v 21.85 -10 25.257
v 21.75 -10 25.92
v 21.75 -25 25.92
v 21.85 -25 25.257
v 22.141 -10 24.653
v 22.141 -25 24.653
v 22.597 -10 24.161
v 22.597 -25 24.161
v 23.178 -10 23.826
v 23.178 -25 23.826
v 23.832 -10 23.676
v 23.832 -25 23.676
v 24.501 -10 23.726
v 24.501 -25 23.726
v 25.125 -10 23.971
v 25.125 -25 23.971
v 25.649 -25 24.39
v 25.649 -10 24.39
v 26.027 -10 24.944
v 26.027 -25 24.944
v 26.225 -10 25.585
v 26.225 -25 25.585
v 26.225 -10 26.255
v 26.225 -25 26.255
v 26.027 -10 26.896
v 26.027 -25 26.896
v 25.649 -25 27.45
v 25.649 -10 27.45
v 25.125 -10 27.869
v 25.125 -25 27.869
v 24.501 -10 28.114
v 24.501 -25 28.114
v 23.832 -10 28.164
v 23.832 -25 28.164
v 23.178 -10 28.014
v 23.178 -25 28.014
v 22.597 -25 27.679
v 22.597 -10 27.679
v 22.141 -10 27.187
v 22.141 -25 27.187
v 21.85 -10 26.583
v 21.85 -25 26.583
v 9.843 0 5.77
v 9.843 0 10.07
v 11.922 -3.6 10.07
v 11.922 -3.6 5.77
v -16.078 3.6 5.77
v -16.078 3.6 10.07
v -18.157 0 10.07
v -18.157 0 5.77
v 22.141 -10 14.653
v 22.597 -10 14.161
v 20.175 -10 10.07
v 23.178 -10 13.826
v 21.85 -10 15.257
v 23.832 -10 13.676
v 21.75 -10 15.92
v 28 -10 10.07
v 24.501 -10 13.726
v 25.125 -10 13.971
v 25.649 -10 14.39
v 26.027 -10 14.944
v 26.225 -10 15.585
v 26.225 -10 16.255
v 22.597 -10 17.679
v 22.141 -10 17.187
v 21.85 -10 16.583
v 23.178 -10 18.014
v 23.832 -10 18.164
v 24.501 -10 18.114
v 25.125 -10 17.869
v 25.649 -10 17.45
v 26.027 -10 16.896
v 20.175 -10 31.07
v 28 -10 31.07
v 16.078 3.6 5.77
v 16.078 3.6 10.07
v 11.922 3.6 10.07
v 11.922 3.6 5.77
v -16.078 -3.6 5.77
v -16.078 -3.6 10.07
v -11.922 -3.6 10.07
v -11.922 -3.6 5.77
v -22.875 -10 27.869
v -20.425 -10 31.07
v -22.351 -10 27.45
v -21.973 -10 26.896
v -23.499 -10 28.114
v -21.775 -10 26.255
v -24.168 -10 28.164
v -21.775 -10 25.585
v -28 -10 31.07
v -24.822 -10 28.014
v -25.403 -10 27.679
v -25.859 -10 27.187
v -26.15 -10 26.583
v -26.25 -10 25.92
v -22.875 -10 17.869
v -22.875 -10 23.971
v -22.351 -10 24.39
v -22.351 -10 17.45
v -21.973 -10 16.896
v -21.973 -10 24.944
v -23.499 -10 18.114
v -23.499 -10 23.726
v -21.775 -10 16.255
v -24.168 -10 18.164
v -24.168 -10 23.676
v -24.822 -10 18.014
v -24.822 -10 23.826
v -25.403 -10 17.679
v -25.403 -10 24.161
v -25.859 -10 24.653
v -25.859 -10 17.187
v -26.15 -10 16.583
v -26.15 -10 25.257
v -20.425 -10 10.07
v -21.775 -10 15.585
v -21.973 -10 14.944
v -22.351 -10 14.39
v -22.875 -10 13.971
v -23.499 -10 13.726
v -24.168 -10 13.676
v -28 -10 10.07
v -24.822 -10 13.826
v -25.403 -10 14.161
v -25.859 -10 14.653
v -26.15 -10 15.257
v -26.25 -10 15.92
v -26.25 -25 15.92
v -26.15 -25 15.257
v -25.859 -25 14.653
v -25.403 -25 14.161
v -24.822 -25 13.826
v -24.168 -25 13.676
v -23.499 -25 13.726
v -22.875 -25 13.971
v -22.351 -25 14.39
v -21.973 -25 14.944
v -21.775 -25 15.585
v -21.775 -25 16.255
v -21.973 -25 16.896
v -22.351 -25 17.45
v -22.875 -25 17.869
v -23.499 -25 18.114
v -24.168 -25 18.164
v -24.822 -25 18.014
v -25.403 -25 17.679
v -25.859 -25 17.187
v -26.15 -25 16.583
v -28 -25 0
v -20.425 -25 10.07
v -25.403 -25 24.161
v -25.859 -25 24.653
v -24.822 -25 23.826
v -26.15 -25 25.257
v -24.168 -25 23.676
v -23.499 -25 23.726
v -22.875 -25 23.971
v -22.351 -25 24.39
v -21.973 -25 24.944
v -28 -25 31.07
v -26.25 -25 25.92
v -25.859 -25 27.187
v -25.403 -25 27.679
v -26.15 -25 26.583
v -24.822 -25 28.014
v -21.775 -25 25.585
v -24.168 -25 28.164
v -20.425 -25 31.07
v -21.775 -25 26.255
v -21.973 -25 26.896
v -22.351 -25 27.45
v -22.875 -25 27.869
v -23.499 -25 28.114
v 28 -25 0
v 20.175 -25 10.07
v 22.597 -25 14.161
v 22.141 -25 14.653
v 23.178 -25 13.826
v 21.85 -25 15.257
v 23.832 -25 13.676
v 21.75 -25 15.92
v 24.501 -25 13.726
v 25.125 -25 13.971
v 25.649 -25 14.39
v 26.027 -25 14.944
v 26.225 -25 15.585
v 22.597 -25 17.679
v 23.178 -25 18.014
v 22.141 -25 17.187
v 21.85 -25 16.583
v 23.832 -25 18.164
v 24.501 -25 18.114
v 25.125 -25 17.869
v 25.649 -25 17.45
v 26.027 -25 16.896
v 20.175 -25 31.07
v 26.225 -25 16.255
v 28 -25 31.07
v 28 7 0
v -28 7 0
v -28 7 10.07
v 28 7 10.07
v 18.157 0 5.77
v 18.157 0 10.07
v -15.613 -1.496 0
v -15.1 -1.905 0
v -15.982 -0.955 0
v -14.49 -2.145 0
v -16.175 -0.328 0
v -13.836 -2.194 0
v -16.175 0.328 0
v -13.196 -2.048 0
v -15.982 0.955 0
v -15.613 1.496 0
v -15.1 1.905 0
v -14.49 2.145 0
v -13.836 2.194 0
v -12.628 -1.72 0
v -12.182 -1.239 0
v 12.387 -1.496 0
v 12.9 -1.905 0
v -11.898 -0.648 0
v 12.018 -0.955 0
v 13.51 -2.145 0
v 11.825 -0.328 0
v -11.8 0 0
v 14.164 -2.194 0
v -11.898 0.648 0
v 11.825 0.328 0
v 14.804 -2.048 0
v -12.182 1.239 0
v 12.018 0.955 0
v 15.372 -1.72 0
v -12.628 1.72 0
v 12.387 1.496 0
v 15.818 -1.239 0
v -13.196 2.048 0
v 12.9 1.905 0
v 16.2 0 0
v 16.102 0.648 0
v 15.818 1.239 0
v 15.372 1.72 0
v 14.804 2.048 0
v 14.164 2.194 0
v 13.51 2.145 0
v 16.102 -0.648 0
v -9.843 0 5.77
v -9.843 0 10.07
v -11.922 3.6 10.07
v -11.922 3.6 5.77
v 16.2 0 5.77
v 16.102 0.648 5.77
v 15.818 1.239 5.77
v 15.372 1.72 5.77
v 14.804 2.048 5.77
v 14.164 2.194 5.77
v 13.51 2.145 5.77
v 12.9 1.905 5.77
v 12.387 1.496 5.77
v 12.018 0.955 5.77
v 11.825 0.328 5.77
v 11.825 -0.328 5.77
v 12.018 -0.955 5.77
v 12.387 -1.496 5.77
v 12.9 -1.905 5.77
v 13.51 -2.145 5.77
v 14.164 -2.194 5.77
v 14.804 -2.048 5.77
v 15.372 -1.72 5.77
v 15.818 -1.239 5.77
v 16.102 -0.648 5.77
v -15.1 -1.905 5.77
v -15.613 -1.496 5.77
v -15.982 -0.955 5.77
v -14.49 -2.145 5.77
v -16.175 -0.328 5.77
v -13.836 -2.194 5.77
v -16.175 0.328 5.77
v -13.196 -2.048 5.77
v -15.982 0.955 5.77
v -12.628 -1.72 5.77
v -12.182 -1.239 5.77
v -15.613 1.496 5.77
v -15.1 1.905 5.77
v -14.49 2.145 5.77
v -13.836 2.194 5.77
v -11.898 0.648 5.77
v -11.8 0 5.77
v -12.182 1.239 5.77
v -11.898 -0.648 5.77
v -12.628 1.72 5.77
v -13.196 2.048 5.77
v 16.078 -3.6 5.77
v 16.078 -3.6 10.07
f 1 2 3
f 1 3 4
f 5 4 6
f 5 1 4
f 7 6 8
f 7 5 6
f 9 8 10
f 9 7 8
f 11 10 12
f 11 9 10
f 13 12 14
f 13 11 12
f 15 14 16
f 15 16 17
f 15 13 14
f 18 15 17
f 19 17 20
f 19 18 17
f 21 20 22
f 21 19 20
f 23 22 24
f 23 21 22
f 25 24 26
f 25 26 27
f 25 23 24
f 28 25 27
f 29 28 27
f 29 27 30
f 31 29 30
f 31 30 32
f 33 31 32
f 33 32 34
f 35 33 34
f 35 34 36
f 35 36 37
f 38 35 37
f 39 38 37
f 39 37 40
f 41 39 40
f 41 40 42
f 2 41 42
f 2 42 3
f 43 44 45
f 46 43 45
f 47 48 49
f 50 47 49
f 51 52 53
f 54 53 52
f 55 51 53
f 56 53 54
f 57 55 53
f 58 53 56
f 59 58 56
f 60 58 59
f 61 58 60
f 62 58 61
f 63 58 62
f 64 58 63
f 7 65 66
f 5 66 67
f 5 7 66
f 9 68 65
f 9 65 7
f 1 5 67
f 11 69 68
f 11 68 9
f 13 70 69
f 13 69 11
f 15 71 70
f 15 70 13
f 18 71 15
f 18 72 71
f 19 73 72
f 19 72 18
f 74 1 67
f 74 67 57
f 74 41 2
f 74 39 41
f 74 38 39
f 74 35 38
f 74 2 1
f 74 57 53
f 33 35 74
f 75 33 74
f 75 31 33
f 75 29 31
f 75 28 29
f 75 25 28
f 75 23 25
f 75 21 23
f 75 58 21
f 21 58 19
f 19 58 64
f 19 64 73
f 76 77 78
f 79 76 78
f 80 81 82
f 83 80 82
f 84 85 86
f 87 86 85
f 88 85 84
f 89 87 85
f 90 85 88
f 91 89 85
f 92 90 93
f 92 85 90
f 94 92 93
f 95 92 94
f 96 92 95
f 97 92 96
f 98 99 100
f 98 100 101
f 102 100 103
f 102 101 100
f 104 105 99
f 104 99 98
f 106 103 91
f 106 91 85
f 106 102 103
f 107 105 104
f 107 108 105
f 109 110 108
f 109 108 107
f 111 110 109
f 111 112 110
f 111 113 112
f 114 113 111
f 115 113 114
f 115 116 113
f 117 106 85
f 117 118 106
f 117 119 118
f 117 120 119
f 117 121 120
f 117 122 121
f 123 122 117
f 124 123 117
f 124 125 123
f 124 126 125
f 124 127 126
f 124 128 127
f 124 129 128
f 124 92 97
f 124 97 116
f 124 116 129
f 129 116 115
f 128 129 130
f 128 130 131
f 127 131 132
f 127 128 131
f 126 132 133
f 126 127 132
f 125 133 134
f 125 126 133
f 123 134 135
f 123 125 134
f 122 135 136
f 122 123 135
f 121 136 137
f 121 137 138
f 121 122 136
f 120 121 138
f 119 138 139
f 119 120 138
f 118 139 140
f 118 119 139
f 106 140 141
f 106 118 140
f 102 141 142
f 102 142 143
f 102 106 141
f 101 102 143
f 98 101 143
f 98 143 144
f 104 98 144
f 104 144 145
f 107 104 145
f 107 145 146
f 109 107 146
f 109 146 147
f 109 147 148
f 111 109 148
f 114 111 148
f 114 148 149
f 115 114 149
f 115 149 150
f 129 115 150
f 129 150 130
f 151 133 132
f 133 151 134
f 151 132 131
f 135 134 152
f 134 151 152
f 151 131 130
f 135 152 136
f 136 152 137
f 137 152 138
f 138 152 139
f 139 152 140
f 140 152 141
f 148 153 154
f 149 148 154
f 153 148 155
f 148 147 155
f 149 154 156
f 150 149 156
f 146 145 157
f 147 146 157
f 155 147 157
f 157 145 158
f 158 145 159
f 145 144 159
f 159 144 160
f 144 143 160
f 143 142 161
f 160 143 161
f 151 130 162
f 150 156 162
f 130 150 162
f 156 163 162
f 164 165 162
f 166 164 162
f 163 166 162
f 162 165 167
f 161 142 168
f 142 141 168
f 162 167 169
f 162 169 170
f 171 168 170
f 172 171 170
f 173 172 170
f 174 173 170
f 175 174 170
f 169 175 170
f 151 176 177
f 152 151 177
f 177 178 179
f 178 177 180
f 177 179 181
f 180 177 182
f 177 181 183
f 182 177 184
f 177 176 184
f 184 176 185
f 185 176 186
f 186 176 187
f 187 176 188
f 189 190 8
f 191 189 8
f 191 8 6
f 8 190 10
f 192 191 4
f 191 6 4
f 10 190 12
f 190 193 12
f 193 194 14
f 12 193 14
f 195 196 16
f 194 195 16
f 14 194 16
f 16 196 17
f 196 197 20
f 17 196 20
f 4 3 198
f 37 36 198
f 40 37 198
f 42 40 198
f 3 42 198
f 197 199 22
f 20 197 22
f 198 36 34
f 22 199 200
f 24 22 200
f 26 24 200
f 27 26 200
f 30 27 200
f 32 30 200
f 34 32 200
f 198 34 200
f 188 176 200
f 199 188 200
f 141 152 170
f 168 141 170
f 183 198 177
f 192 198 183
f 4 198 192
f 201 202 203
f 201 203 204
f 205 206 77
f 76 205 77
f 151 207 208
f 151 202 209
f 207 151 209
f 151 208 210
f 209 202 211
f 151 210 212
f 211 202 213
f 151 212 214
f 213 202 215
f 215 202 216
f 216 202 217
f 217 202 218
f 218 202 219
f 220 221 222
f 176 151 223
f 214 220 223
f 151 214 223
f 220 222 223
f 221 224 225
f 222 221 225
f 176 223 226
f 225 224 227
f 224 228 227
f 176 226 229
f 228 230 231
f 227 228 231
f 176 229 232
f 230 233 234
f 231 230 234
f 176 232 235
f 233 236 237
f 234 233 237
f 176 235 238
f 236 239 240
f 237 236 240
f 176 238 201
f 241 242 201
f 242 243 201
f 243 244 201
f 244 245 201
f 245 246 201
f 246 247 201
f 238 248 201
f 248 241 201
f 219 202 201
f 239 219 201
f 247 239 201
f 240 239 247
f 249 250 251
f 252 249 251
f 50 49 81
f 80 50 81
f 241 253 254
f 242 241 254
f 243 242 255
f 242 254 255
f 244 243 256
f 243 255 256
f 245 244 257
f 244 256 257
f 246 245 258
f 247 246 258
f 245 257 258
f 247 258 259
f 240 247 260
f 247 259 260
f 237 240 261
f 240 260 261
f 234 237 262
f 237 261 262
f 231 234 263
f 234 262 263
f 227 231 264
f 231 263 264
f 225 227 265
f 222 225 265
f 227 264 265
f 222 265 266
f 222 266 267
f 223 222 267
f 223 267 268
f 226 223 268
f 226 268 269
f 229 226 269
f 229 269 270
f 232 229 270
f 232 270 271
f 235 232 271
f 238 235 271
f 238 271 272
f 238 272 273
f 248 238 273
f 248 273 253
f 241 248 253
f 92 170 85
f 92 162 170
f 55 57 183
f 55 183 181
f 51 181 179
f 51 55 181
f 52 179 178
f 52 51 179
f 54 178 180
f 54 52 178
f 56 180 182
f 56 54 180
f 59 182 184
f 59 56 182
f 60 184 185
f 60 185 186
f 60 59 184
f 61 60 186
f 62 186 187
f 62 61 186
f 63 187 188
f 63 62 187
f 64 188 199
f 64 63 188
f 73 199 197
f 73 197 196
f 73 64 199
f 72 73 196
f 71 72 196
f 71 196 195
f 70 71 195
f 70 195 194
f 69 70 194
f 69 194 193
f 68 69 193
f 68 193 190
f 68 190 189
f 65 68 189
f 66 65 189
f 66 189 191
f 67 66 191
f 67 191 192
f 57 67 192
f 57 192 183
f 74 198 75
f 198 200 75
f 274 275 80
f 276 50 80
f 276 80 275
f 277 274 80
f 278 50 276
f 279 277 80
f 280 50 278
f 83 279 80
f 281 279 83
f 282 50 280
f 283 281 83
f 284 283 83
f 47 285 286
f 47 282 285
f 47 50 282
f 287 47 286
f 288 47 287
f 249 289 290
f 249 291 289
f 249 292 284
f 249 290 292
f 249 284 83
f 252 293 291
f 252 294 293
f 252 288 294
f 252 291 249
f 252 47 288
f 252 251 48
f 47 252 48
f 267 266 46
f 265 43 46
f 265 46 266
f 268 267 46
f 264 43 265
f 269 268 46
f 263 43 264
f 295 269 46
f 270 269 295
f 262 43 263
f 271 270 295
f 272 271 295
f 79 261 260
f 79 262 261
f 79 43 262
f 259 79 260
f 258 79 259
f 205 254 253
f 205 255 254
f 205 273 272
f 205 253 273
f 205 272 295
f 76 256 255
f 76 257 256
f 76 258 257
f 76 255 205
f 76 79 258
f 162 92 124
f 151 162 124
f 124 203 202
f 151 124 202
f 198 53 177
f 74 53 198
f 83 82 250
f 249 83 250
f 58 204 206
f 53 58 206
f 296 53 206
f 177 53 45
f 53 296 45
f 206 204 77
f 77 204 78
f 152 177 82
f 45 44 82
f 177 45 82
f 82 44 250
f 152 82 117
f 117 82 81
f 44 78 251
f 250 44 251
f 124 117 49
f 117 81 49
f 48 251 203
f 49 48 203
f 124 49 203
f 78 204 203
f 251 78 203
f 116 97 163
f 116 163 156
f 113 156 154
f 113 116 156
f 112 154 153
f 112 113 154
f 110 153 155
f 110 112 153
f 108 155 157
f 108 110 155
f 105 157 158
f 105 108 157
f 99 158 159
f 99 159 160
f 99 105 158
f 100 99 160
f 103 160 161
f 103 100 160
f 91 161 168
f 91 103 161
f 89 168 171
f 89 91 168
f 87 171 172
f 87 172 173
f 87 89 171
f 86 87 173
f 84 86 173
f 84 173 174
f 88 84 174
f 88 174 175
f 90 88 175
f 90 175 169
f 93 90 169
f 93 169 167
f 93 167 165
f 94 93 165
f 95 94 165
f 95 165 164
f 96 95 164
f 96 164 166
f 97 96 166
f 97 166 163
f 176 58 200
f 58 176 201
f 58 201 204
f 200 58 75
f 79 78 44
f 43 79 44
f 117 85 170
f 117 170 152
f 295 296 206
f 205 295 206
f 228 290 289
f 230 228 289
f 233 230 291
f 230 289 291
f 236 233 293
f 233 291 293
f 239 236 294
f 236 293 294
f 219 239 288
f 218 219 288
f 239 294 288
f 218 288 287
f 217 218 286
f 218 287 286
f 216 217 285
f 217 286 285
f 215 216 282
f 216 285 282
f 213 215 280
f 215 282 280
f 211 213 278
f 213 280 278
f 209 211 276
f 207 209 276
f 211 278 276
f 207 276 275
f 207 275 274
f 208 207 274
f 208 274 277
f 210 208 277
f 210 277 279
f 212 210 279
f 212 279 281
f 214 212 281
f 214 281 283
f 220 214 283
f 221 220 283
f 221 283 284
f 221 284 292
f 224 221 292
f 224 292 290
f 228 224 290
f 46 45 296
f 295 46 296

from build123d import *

# Parameters (mm, degrees)
SZKIC1_W                       = 40
SZKIC1_H                       = 14
SZKIC1_R                       = 2
DODANIE_WYCI_GNI_CIE1_DEPTH    = 10.77
SZKIC2_W                       = 56
SZKIC2_H                       = 14
DODANIE_WYCI_GNI_CIE2_DEPTH    = 20.3
SZKIC5_R                       = 2.25
WYTNIJ_WYCI_GNI_CIE2_DEPTH     = 14
SZKIC8_W                       = 56
SZKIC8_H                       = 10.77
DODANIE_WYCI_GNI_CIE3_DEPTH    = 14
WYTNIJ_WYCI_GNI_CIE3_START     = -14
WYTNIJ_WYCI_GNI_CIE3_OUTLINE_W = 42
WYTNIJ_WYCI_GNI_CIE3_OUTLINE_H = 21
WYTNIJ_WYCI_GNI_CIE3_DEPTH     = 14
SZKIC12_R                      = 2.25
DODANIE_WYCI_GNI_CIE4_DEPTH    = 18
WYTNIJ_WYCI_GNI_CIE1_DEPTH     = 5
SZKIC9_R                       = 2.2
WYTNIJ_WYCI_GNI_CIE4_DEPTH     = 21
SZKIC10_W                      = 56
SZKIC10_H                      = 21
WYTNIJ_WYCI_GNI_CIE5_DEPTH     = 17
SZKIC13_W                      = 21
SZKIC13_H                      = 15
DODANIE_WYCI_GNI_CIE5_DEPTH    = 0.7
SZKIC16_W                      = 21
SZKIC16_H                      = 15
DODANIE_WYCI_GNI_CIE7_DEPTH    = 0.7


# Read off the part's stored shape, not the designer's step: Wytnij-wyciągnięcie3
with BuildPart() as part:
    # Szkic1 → Dodanie-wyciągnięcie1 (new body)
    with BuildSketch(Plane.XY):
        Rectangle(SZKIC1_W, SZKIC1_H)
        with Locations((-14, 0)):
            Circle(SZKIC1_R, mode=Mode.SUBTRACT)
        with Locations((14, 0)):
            Circle(SZKIC1_R, mode=Mode.SUBTRACT)
    extrude(amount=DODANIE_WYCI_GNI_CIE1_DEPTH)

    # Szkic2 → Dodanie-wyciągnięcie2 (add)
    with BuildSketch(Plane.XY.offset(10.77)):
        Rectangle(SZKIC2_W, SZKIC2_H)
    extrude(amount=DODANIE_WYCI_GNI_CIE2_DEPTH)

    # Szkic5 → Wytnij-wyciągnięcie2 (cut)
    with BuildSketch(Plane(origin=(0, 7, 0), x_dir=(1, 0, 0), z_dir=(0, 1, 0))):
        with Locations(Location((-24, -15.92, 0), (0, 0, 180))):
            Circle(SZKIC5_R)
        with Locations(Location((24, -15.92, 0), (0, 0, 180))):
            Circle(SZKIC5_R)
        with Locations(Location((24, -25.92, 0), (0, 0, 180))):
            Circle(SZKIC5_R)
        with Locations(Location((-24, -25.92, 0), (0, 0, 180))):
            Circle(SZKIC5_R)
    extrude(amount=-WYTNIJ_WYCI_GNI_CIE2_DEPTH, mode=Mode.SUBTRACT)

    # Szkic8 → Dodanie-wyciągnięcie3 (add)
    with BuildSketch(Plane(origin=(0, 7, 0), x_dir=(1, 0, 0), z_dir=(0, 1, 0))):
        with Locations((0, -5.385)):
            Rectangle(SZKIC8_W, SZKIC8_H)
    extrude(amount=-DODANIE_WYCI_GNI_CIE3_DEPTH)

    # Wytnij-wyciągnięcie3 outline → Wytnij-wyciągnięcie3 (cut)
    with BuildSketch(Plane(origin=(0, 7, 0), x_dir=(1, 0, 0), z_dir=(0, 1, 0)).offset(WYTNIJ_WYCI_GNI_CIE3_START)):
        with Locations((-0.124911353, -20.57)):
            Rectangle(WYTNIJ_WYCI_GNI_CIE3_OUTLINE_W, WYTNIJ_WYCI_GNI_CIE3_OUTLINE_H)
    extrude(amount=WYTNIJ_WYCI_GNI_CIE3_DEPTH, mode=Mode.SUBTRACT)

    # Szkic12 → Dodanie-wyciągnięcie4 (add)
    with BuildSketch(Plane.XZ.offset(7)):
        Polygon((20.875088647, 31.07), (20.875088647, 10.07), (-21.124911353, 10.07), (-21.124911353, 31.07), (-28, 31.07), (-28, 0), (28, 0), (28, 31.07), align=None)
        with Locations(Location((-24, 25.92, 0), (0, 0, 180))):
            Circle(SZKIC12_R, mode=Mode.SUBTRACT)
        with Locations(Location((24, 25.92, 0), (0, 0, 180))):
            Circle(SZKIC12_R, mode=Mode.SUBTRACT)
        with Locations(Location((-24, 15.92, 0), (0, 0, 180))):
            Circle(SZKIC12_R, mode=Mode.SUBTRACT)
        with Locations(Location((24, 15.92, 0), (0, 0, 180))):
            Circle(SZKIC12_R, mode=Mode.SUBTRACT)
    extrude(amount=DODANIE_WYCI_GNI_CIE4_DEPTH)

    # Szkic4 → Wytnij-wyciągnięcie1 (cut)
    with BuildSketch(Plane.XY.offset(10.77)):
        Polygon((-16.078460969, 3.6), (-18.156921938, 0), (-16.078460969, -3.6), (-11.921539031, -3.6), (-9.843078062, 0), (-11.921539031, 3.6), align=None)
        Polygon((11.921539031, 3.6), (9.843078062, 0), (11.921539031, -3.6), (16.078460969, -3.6), (18.156921938, 0), (16.078460969, 3.6), align=None)
    extrude(amount=-WYTNIJ_WYCI_GNI_CIE1_DEPTH, mode=Mode.SUBTRACT)

    # Szkic9 → Wytnij-wyciągnięcie4 (cut)
    with BuildSketch(Plane.XY.offset(10.07)):
        with Locations((-14, 0)):
            Circle(SZKIC9_R)
        with Locations((14, 0)):
            Circle(SZKIC9_R)
    extrude(amount=-WYTNIJ_WYCI_GNI_CIE4_DEPTH, mode=Mode.SUBTRACT)

    # Szkic10 → Wytnij-wyciągnięcie5 (cut)
    with BuildSketch(Plane(origin=(0, 7, 0), x_dir=(1, 0, 0), z_dir=(0, 1, 0))):
        with Locations((0, -20.57)):
            Rectangle(SZKIC10_W, SZKIC10_H)
    extrude(amount=-WYTNIJ_WYCI_GNI_CIE5_DEPTH, mode=Mode.SUBTRACT)

    # Szkic13 → Dodanie-wyciągnięcie5 (add)
    with BuildSketch(Plane(origin=(-21.124911353, 0, 0), x_dir=(0, 0, -1), z_dir=(1, 0, 0))):
        with Locations((-20.57, -17.5)):
            Rectangle(SZKIC13_W, SZKIC13_H)
    extrude(amount=DODANIE_WYCI_GNI_CIE5_DEPTH)

    # Szkic16 → Dodanie-wyciągnięcie7 (add)
    with BuildSketch(Plane.ZY.offset(-20.875088647)):
        with Locations((20.57, -17.5)):
            Rectangle(SZKIC16_W, SZKIC16_H)
    extrude(amount=DODANIE_WYCI_GNI_CIE7_DEPTH)


solid = part.part
